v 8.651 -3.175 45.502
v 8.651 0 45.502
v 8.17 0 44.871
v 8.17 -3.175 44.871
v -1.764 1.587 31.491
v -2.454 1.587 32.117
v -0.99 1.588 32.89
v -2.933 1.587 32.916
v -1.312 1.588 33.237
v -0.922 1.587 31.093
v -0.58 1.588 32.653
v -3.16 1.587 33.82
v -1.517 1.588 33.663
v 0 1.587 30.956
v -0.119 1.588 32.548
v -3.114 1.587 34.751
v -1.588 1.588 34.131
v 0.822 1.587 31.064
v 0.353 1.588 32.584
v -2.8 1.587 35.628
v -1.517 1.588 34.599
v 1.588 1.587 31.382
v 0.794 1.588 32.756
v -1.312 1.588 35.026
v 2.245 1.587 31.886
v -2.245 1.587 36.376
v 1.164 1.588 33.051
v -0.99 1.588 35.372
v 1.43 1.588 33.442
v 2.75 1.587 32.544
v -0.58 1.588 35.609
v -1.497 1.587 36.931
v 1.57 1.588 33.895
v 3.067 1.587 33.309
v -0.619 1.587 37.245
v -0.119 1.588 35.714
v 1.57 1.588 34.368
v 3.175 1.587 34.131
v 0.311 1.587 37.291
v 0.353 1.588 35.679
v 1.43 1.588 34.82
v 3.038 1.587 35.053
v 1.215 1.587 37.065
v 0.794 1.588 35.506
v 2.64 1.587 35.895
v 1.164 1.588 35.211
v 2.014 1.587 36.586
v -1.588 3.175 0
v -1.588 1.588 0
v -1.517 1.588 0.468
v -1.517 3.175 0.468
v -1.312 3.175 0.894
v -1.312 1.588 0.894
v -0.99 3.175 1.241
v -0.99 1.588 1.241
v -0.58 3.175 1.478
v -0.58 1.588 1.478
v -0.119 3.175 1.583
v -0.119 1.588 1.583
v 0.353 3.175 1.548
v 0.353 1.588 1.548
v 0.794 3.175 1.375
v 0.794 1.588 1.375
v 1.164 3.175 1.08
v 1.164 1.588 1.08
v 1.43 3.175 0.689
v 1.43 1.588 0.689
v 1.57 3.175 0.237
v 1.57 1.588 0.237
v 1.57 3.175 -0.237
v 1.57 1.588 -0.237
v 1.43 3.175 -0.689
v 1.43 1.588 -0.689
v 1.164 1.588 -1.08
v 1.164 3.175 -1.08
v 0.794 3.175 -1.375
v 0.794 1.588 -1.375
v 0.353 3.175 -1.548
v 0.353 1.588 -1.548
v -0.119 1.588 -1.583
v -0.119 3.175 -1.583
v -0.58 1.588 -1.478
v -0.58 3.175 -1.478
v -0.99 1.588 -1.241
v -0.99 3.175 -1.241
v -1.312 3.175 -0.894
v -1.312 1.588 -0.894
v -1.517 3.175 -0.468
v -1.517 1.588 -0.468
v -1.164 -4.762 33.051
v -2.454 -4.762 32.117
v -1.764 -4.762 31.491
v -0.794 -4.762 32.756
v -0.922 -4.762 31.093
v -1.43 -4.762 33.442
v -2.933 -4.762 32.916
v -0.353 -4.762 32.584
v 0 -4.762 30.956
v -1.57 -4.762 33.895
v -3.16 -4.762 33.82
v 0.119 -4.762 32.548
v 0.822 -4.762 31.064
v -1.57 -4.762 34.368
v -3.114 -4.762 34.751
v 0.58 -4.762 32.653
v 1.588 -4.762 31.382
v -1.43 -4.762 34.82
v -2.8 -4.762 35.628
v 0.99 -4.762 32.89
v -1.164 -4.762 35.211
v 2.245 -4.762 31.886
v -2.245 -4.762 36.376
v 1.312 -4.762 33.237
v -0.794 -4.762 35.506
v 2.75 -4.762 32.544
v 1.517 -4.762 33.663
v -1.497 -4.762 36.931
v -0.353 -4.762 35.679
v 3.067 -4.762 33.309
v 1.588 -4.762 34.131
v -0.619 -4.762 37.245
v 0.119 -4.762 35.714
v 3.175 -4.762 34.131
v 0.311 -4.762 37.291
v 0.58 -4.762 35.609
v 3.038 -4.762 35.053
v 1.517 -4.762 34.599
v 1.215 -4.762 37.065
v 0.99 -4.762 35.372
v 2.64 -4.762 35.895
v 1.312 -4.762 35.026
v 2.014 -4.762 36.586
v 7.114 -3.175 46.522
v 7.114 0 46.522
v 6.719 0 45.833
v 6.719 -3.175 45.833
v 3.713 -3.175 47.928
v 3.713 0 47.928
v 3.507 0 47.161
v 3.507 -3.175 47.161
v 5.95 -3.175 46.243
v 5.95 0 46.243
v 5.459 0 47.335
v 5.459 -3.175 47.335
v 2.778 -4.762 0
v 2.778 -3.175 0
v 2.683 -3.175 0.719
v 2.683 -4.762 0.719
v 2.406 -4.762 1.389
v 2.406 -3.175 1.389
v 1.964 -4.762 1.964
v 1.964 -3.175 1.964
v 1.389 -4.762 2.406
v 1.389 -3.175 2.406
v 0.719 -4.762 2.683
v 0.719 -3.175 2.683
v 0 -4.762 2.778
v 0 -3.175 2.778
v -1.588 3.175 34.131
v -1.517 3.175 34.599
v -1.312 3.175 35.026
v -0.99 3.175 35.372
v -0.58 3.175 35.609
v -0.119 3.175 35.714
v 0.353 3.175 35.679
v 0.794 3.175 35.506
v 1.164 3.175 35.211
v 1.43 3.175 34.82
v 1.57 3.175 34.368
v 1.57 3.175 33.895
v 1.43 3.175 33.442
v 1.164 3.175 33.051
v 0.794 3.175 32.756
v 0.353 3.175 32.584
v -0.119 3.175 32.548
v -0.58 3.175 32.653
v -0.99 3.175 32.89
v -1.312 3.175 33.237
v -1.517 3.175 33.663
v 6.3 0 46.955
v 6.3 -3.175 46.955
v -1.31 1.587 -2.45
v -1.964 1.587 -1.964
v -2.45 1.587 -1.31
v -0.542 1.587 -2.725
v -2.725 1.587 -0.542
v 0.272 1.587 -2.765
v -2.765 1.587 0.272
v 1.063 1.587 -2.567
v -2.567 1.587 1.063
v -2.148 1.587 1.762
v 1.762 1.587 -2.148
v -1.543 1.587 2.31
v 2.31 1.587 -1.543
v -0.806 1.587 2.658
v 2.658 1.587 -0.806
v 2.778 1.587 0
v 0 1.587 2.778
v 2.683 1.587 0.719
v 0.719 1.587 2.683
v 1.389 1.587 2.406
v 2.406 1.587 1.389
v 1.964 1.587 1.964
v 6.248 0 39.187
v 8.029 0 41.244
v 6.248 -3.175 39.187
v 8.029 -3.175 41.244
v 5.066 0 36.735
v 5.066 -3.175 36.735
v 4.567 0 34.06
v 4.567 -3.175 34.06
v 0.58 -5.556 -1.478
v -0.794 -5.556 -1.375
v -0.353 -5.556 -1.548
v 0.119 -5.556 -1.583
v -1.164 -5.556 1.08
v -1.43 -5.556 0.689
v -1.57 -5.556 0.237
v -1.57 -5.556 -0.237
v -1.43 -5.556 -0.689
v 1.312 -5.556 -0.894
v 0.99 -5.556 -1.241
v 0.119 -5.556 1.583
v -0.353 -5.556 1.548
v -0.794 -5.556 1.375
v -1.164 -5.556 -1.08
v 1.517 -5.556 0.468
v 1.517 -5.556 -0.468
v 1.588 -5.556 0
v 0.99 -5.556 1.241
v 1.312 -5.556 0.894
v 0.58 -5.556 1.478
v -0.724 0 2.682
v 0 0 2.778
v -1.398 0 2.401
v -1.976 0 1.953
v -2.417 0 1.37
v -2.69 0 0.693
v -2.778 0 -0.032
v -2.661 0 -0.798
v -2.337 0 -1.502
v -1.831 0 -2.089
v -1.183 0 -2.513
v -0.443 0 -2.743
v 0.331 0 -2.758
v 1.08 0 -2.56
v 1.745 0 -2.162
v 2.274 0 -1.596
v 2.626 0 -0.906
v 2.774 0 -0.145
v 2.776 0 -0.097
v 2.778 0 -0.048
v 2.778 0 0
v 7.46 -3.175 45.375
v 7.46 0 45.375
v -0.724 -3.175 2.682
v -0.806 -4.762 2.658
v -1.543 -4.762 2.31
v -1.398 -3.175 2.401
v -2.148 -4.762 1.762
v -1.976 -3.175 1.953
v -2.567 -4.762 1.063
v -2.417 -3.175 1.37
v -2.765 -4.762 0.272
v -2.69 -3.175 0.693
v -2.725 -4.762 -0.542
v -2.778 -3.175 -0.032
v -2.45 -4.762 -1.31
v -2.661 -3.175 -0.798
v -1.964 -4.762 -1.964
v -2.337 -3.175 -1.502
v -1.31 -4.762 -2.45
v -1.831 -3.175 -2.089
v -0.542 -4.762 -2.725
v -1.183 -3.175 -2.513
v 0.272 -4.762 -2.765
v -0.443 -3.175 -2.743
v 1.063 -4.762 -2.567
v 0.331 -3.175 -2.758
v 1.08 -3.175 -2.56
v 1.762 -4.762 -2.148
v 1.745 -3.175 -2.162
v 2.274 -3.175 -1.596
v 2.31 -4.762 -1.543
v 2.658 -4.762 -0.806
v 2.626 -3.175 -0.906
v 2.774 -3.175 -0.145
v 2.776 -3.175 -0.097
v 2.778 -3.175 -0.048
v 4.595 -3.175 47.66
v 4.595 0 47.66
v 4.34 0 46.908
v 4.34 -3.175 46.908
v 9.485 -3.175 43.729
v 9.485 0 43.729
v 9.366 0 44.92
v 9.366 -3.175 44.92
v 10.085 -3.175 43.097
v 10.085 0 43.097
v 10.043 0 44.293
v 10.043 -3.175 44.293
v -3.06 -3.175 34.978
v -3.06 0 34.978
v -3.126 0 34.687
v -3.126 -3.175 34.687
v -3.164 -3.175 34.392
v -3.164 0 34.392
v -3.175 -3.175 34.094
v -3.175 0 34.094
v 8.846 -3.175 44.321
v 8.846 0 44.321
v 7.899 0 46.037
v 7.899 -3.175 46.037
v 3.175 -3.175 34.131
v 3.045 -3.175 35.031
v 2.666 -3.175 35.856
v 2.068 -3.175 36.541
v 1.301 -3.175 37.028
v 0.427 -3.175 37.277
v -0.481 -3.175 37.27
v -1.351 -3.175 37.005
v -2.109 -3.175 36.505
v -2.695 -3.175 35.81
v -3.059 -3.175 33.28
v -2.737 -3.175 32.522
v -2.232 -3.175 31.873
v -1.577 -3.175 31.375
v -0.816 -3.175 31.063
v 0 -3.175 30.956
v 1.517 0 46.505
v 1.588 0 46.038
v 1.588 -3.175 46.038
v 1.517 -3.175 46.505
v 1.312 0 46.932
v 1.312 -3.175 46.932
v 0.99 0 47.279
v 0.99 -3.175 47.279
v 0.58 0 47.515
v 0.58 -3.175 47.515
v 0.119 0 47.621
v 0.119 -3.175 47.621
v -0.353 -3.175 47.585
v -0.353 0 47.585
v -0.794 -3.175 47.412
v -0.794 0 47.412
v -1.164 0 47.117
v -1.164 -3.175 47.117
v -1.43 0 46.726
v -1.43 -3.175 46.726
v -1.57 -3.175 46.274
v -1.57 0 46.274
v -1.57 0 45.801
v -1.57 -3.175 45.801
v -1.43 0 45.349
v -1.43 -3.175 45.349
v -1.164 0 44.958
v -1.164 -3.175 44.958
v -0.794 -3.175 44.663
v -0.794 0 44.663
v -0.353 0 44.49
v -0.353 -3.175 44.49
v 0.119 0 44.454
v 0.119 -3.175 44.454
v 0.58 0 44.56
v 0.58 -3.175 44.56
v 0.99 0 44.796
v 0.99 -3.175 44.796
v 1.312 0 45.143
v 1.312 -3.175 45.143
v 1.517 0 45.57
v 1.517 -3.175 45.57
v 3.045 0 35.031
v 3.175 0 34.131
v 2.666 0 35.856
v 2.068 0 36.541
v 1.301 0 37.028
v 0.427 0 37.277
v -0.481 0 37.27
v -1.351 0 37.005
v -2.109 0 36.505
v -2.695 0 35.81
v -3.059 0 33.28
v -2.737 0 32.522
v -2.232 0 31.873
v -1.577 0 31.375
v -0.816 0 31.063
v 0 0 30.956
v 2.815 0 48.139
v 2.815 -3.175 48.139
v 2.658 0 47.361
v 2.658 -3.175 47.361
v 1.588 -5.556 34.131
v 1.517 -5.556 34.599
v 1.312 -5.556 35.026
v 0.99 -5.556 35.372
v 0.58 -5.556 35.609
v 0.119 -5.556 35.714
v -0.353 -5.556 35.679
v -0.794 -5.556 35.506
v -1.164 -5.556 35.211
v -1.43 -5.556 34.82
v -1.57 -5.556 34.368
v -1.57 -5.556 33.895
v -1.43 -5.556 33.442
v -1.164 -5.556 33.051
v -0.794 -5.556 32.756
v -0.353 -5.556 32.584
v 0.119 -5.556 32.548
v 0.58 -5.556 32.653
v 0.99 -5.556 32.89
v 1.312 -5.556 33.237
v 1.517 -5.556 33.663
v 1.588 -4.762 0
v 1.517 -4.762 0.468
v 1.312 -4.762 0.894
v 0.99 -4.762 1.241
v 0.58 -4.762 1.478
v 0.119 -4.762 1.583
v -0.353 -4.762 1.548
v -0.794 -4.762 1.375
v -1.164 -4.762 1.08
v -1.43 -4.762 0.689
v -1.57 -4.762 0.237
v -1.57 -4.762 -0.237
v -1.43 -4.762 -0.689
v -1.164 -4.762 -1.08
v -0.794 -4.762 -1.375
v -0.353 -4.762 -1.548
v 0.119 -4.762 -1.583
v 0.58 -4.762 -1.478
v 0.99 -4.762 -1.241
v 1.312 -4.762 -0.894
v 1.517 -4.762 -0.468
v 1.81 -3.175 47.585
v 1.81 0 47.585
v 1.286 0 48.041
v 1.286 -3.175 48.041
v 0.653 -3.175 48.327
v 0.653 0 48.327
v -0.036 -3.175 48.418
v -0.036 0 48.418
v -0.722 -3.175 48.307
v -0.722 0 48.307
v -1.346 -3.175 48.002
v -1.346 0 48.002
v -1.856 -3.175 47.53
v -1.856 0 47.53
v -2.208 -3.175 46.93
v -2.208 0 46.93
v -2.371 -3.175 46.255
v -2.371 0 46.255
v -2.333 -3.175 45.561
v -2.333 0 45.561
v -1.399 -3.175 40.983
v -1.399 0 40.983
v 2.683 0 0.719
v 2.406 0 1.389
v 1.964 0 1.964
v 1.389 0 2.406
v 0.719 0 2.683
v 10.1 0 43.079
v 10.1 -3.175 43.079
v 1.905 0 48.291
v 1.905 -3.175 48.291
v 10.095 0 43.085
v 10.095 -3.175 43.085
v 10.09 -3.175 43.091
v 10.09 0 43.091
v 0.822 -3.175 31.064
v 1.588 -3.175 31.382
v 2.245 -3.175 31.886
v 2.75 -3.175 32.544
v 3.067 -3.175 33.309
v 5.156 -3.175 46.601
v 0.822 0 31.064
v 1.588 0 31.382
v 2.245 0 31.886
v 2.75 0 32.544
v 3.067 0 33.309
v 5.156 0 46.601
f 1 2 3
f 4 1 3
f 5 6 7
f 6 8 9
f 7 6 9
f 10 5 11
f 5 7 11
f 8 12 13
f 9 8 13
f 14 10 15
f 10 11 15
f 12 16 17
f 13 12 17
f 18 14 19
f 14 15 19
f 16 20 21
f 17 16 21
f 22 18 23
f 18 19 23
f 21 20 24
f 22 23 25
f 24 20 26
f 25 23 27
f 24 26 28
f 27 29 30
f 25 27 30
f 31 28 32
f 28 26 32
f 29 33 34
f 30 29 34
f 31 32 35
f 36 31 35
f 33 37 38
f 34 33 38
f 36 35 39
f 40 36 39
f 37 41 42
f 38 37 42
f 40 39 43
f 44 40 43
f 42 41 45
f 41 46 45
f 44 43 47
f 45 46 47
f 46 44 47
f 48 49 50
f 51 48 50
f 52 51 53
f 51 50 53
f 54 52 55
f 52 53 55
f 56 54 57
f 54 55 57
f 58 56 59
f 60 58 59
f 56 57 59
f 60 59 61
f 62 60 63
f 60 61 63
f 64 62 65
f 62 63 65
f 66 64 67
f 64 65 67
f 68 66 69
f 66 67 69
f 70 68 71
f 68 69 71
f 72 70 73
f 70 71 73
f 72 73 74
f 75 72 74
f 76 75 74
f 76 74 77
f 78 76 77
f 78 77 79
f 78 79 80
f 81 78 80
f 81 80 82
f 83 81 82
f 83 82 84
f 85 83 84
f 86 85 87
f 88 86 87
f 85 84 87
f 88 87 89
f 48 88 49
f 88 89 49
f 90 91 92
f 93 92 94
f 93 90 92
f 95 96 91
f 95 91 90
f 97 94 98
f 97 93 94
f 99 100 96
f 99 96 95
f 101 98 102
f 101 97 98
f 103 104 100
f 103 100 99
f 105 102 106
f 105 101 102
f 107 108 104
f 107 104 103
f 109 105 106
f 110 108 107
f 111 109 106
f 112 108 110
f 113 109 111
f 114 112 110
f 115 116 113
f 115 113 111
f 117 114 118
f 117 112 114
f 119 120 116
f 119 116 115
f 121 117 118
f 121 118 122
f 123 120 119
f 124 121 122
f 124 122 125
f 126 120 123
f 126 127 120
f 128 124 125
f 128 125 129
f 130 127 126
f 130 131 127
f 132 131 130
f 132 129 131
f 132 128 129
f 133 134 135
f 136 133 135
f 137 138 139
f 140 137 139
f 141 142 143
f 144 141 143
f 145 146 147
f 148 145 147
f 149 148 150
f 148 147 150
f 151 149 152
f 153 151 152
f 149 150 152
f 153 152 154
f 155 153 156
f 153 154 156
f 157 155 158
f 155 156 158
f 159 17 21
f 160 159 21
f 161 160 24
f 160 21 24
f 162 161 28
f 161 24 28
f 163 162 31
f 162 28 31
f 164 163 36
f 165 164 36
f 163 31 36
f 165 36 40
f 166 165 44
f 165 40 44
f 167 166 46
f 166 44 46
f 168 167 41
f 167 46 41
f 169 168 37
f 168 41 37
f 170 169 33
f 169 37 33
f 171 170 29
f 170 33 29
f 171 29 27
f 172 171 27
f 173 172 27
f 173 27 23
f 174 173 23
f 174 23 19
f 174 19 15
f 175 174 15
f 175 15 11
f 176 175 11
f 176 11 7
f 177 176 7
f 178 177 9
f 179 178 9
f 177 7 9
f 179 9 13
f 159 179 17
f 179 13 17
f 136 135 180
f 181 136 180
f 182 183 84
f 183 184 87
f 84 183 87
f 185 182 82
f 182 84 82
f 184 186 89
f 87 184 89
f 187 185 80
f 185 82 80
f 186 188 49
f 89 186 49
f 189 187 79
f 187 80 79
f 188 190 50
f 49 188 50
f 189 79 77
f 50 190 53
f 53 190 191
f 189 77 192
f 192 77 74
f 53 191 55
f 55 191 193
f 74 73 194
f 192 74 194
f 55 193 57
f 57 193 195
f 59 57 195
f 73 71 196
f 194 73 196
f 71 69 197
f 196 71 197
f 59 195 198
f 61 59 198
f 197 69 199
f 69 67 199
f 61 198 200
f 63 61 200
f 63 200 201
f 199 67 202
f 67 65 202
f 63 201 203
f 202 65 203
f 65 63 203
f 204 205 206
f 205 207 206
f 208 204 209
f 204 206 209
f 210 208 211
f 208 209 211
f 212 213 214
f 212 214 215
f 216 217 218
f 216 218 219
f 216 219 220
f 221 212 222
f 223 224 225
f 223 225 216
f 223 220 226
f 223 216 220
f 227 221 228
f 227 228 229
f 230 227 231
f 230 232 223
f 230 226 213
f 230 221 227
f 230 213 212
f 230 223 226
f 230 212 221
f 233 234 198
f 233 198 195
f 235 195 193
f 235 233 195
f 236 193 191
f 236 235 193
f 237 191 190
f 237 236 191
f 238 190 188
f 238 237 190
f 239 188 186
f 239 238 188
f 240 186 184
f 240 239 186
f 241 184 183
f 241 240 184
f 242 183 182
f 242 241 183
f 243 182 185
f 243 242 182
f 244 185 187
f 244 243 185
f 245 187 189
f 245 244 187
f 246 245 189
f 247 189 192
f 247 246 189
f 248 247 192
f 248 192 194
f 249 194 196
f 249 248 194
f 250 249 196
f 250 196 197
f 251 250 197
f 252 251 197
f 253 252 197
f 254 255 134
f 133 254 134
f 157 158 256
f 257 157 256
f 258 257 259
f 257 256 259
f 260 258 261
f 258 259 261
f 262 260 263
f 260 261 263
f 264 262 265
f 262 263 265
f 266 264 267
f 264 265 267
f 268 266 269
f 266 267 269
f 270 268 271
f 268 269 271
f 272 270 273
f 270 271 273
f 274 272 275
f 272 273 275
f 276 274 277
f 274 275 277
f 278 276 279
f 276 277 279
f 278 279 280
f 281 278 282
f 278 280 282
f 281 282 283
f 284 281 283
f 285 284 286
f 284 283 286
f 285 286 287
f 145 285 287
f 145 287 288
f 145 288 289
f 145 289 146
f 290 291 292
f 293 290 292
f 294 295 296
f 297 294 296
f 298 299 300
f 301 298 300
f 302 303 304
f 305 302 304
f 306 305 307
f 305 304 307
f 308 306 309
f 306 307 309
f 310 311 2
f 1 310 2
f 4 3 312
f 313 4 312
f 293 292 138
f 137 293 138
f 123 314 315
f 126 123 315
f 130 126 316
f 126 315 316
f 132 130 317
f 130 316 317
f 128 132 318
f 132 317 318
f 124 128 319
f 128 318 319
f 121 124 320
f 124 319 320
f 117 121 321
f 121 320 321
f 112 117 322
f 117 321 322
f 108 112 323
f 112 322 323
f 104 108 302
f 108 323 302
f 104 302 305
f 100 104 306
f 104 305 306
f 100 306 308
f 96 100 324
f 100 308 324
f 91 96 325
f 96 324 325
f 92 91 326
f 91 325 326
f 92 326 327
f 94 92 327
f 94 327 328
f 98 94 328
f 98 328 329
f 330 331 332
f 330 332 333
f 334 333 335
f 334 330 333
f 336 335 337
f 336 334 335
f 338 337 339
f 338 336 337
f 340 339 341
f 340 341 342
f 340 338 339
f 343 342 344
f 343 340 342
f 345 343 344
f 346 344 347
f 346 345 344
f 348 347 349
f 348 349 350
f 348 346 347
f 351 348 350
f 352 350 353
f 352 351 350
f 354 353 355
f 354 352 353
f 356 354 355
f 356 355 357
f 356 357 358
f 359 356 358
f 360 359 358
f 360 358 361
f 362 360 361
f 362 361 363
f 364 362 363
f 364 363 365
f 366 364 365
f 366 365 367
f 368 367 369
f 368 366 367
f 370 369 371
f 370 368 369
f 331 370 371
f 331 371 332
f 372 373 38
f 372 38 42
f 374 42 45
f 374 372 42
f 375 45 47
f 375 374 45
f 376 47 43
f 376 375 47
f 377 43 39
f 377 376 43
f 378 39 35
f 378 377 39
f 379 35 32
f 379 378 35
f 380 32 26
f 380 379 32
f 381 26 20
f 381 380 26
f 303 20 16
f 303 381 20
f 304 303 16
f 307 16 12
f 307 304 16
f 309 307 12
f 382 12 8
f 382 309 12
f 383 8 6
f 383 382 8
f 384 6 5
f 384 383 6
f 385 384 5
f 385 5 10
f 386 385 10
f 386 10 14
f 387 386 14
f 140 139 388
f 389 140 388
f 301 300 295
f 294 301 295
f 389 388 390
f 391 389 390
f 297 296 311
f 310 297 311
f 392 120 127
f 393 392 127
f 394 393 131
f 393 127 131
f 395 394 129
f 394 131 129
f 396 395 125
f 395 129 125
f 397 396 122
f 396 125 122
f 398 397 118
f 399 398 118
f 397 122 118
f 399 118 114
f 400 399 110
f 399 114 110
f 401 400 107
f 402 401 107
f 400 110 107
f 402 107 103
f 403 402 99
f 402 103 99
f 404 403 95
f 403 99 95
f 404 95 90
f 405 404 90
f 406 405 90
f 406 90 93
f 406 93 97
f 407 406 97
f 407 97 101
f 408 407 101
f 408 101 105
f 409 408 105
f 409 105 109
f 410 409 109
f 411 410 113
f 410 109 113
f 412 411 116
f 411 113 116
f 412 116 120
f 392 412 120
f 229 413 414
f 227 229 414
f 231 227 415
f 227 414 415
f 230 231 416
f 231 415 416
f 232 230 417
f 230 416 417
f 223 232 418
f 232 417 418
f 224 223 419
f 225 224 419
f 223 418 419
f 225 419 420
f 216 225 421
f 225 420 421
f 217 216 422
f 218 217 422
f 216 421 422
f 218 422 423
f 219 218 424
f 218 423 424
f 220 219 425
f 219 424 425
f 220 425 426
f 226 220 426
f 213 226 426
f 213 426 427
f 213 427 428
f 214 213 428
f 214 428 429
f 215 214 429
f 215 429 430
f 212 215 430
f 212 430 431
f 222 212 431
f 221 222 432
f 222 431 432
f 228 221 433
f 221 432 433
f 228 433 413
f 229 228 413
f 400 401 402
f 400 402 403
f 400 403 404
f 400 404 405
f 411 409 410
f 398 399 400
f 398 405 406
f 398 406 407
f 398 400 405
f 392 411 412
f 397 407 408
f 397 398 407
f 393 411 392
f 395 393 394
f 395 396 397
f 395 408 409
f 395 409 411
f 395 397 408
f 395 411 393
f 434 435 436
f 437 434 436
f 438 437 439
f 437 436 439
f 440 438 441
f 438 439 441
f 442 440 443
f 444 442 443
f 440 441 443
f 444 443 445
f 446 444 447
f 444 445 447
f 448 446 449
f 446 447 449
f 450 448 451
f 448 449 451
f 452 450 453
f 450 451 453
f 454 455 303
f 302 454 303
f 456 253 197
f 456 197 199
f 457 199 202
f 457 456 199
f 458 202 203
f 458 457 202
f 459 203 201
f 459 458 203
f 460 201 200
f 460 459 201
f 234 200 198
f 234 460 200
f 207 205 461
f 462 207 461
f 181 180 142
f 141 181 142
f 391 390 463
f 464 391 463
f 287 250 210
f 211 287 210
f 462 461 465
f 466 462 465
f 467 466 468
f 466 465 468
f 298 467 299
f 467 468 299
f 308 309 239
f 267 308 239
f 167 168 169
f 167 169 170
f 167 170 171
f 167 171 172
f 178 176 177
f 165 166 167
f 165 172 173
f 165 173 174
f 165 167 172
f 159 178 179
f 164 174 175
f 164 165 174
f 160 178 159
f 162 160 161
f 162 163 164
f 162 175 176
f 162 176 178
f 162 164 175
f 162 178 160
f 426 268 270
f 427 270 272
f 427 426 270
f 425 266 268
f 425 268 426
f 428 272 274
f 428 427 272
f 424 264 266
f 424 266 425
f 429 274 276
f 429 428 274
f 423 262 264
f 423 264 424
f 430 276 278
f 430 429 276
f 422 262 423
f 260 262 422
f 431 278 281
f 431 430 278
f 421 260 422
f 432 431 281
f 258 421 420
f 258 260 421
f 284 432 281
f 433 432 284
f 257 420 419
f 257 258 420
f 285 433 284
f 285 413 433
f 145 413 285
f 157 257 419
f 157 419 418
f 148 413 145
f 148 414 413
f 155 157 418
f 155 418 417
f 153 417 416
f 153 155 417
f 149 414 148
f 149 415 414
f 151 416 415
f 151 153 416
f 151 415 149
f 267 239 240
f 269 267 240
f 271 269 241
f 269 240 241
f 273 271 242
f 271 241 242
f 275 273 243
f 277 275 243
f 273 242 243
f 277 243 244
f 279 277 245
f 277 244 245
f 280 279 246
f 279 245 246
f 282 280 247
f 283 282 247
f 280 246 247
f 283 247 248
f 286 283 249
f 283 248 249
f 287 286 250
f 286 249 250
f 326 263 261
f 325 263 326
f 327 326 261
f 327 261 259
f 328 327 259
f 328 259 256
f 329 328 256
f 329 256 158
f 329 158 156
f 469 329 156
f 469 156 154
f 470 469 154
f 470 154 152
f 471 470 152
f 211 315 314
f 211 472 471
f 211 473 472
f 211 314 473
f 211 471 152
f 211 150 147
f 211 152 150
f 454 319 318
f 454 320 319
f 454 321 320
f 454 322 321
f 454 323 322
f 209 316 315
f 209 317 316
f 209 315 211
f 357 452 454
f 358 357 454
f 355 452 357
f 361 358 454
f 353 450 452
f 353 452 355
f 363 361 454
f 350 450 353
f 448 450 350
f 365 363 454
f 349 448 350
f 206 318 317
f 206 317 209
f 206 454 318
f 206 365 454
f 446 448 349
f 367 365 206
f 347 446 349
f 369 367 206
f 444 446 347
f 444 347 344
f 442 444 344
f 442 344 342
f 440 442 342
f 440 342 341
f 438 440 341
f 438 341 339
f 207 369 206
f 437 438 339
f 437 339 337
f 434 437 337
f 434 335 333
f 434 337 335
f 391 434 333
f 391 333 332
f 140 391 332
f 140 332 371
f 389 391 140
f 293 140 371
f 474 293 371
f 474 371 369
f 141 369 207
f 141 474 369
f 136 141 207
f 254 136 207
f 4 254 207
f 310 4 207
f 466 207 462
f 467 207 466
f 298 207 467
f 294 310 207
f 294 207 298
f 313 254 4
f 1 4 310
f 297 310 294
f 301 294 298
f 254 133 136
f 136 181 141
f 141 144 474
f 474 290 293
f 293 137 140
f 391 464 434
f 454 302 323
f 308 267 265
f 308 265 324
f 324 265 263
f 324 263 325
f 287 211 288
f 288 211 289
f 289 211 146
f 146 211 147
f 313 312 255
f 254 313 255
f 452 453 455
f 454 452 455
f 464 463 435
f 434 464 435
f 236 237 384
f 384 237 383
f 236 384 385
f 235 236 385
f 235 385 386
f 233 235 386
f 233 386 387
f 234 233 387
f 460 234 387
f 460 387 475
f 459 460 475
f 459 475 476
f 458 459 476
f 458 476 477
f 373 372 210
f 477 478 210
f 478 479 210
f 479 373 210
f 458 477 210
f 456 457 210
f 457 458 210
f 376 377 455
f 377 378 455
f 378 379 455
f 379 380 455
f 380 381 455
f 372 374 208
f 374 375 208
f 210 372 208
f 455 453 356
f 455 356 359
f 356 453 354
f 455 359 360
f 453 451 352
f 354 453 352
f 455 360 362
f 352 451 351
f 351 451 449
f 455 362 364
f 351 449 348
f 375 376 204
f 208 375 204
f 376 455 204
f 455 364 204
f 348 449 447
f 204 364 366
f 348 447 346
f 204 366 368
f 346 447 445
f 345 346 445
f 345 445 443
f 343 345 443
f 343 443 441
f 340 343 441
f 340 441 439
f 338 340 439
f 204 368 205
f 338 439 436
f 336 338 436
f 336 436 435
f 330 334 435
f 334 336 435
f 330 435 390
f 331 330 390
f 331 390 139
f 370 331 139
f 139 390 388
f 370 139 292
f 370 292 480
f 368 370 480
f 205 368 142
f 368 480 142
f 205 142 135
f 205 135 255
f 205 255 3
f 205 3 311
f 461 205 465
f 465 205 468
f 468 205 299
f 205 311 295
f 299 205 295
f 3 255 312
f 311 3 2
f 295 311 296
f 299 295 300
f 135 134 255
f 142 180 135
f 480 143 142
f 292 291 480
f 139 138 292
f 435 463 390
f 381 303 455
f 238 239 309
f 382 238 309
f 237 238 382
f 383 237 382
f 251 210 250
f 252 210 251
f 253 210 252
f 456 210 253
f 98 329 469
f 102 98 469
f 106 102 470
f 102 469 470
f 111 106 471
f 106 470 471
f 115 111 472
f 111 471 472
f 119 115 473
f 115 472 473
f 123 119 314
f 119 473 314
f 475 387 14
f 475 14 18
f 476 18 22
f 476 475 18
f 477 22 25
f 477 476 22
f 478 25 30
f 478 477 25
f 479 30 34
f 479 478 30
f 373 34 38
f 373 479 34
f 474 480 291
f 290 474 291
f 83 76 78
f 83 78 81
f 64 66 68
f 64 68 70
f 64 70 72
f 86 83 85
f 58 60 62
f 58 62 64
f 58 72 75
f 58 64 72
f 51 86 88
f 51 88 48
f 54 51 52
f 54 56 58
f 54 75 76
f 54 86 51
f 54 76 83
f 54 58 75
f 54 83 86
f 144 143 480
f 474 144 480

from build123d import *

# Parameters (mm, degrees)
F0_R     = 1.5875
F1_DEPTH = 3.175
F5_DEPTH = 1.5875
F6_R     = 1.5875
F7_DEPTH = 0.79375
F8_R     = 1.5875
F9_DEPTH = 1.5875
F10_R    = 10.31875


# Not quite as in the source:
# - a feature of the source that left no trace in its solid (it failed there, or was rolled back) is left out
# - a pattern or mirror of a feature is missing from the dataset's text; its kind, count and spacing are read off the source's solid


with BuildPart() as f1:
    # F0 (on Front) → F1 (new body)
    with BuildSketch(Plane.XZ):
        with BuildLine():
            Line((-3.1747853497, 34.0943313953), (-2.777937181, -0.0323037791))
            ThreePointArc((-2.777937181, -0.0323037791), (-0.0565749778, -2.7775488812), (2.7743176762, -0.1453958284))
            Line((2.7743176762, -0.1453958284), (4.7932141006, 38.3774428034))
            Line((4.7932141006, 38.3774428034), (10.1004515544, 43.0789965018))
            ThreePointArc((10.1004515544, 43.0789965018), (10.0925772968, 43.0878759884), (10.0846956661, 43.0967489312))
            Line((10.0846956661, 43.0967489312), (10.0430595374, 44.2934156835))
            Line((10.0430595374, 44.2934156835), (9.4851117853, 43.7288509233))
            Line((9.4851117853, 43.7288509233), (9.3663379592, 44.9203356649))
            Line((9.3663379592, 44.9203356649), (8.8459858503, 44.3209420168))
            Line((8.8459858503, 44.3209420168), (8.6505703336, 45.5022785002))
            Line((8.6505703336, 45.5022785002), (8.1699830928, 44.8705546947))
            Line((8.1699830928, 44.8705546947), (7.8987405265, 46.0368182075))
            Line((7.8987405265, 46.0368182075), (7.4599216084, 45.3753977516))
            Line((7.4599216084, 45.3753977516), (7.1139827386, 46.5217264172))
            Line((7.1139827386, 46.5217264172), (6.7187614754, 45.8333666162))
            Line((6.7187614754, 45.8333666162), (6.2995684394, 46.9549816615))
            Line((6.2995684394, 46.9549816615), (5.949592415, 46.2425521248))
            Line((5.949592415, 46.2425521248), (5.4588927295, 47.334777802))
            Line((5.4588927295, 47.334777802), (5.1556209112, 46.6012484796))
            Line((5.1556209112, 46.6012484796), (4.5954601871, 47.6595315582))
            Line((4.5954601871, 47.6595315582), (4.3401568434, 46.9079603605))
            Line((4.3401568434, 46.9079603605), (3.7128702582, 47.9278891087))
            Line((3.7128702582, 47.9278891087), (3.5065996883, 47.1614091582))
            Line((3.5065996883, 47.1614091582), (2.8148022515, 48.1387317342))
            Line((2.8148022515, 48.1387317342), (2.6584243486, 47.3605383046))
            Line((2.6584243486, 47.3605383046), (1.905, 48.2911804818))
            Line((1.905, 48.2911804818), (1.8099761367, 47.5848648397))
            ThreePointArc((1.8099761367, 47.5848648397), (-1.0450737271, 48.1771664384), (-2.33313898, 45.56125))
            Line((-2.33313898, 45.56125), (-1.3985654512, 40.9827934547))
            Line((-1.3985654512, 40.9827934547), (-3.0600295024, 34.9779166667))
            ThreePointArc((-3.0600295024, 34.9779166667), (-3.1485567794, 34.5401695607), (-3.1747853497, 34.0943313953))
        make_face()
        with Locations((0, 46.0375)):
            Circle(F0_R, mode=Mode.SUBTRACT)
    extrude(amount=F1_DEPTH)

    # F4 (on face) → F5 (join)
    with BuildSketch(Plane.XZ.offset(3.175)):
        with BuildLine():
            ThreePointArc((0, 2.778125), (-1.9644310265, -1.9644310265), (2.778125, 0))
            ThreePointArc((2.778125, 0), (1.9644310265, 1.9644310265), (0, 2.778125))
        make_face()
        with BuildLine():
            ThreePointArc((3.175, 34.13125), (-2.2450640303, 36.3763140303), (0, 30.95625))
            ThreePointArc((0, 30.95625), (2.2450640303, 31.8861859697), (3.175, 34.13125))
        make_face()
    f5 = extrude(amount=F5_DEPTH)

    # F5_copies: F5 across plane
    add(f5.mirror(Plane.ZX.offset(-1.5875)))

    # F6 (on face) → F7 (join)
    with BuildSketch(Plane.XZ.offset(4.7625)):
        Circle(F6_R)
        with Locations((0, 34.13125)):
            Circle(F6_R)
    extrude(amount=F7_DEPTH)

    # F8 (on face) → F9 (join)
    with BuildSketch(Plane(origin=(0, 1.5875, 0), x_dir=(-1, 0, 0), z_dir=(0, 1, 0))):
        Circle(F8_R)
        with Locations((0, 34.13125)):
            Circle(F8_R)
    extrude(amount=F9_DEPTH)

    # F10
    f10_edges = [f1.edges().sort_by_distance(p)[0] for p in [
        (4.793214, -1.5875, 38.377443),
    ]]
    fillet(f10_edges, radius=F10_R)


solid = f1.part
